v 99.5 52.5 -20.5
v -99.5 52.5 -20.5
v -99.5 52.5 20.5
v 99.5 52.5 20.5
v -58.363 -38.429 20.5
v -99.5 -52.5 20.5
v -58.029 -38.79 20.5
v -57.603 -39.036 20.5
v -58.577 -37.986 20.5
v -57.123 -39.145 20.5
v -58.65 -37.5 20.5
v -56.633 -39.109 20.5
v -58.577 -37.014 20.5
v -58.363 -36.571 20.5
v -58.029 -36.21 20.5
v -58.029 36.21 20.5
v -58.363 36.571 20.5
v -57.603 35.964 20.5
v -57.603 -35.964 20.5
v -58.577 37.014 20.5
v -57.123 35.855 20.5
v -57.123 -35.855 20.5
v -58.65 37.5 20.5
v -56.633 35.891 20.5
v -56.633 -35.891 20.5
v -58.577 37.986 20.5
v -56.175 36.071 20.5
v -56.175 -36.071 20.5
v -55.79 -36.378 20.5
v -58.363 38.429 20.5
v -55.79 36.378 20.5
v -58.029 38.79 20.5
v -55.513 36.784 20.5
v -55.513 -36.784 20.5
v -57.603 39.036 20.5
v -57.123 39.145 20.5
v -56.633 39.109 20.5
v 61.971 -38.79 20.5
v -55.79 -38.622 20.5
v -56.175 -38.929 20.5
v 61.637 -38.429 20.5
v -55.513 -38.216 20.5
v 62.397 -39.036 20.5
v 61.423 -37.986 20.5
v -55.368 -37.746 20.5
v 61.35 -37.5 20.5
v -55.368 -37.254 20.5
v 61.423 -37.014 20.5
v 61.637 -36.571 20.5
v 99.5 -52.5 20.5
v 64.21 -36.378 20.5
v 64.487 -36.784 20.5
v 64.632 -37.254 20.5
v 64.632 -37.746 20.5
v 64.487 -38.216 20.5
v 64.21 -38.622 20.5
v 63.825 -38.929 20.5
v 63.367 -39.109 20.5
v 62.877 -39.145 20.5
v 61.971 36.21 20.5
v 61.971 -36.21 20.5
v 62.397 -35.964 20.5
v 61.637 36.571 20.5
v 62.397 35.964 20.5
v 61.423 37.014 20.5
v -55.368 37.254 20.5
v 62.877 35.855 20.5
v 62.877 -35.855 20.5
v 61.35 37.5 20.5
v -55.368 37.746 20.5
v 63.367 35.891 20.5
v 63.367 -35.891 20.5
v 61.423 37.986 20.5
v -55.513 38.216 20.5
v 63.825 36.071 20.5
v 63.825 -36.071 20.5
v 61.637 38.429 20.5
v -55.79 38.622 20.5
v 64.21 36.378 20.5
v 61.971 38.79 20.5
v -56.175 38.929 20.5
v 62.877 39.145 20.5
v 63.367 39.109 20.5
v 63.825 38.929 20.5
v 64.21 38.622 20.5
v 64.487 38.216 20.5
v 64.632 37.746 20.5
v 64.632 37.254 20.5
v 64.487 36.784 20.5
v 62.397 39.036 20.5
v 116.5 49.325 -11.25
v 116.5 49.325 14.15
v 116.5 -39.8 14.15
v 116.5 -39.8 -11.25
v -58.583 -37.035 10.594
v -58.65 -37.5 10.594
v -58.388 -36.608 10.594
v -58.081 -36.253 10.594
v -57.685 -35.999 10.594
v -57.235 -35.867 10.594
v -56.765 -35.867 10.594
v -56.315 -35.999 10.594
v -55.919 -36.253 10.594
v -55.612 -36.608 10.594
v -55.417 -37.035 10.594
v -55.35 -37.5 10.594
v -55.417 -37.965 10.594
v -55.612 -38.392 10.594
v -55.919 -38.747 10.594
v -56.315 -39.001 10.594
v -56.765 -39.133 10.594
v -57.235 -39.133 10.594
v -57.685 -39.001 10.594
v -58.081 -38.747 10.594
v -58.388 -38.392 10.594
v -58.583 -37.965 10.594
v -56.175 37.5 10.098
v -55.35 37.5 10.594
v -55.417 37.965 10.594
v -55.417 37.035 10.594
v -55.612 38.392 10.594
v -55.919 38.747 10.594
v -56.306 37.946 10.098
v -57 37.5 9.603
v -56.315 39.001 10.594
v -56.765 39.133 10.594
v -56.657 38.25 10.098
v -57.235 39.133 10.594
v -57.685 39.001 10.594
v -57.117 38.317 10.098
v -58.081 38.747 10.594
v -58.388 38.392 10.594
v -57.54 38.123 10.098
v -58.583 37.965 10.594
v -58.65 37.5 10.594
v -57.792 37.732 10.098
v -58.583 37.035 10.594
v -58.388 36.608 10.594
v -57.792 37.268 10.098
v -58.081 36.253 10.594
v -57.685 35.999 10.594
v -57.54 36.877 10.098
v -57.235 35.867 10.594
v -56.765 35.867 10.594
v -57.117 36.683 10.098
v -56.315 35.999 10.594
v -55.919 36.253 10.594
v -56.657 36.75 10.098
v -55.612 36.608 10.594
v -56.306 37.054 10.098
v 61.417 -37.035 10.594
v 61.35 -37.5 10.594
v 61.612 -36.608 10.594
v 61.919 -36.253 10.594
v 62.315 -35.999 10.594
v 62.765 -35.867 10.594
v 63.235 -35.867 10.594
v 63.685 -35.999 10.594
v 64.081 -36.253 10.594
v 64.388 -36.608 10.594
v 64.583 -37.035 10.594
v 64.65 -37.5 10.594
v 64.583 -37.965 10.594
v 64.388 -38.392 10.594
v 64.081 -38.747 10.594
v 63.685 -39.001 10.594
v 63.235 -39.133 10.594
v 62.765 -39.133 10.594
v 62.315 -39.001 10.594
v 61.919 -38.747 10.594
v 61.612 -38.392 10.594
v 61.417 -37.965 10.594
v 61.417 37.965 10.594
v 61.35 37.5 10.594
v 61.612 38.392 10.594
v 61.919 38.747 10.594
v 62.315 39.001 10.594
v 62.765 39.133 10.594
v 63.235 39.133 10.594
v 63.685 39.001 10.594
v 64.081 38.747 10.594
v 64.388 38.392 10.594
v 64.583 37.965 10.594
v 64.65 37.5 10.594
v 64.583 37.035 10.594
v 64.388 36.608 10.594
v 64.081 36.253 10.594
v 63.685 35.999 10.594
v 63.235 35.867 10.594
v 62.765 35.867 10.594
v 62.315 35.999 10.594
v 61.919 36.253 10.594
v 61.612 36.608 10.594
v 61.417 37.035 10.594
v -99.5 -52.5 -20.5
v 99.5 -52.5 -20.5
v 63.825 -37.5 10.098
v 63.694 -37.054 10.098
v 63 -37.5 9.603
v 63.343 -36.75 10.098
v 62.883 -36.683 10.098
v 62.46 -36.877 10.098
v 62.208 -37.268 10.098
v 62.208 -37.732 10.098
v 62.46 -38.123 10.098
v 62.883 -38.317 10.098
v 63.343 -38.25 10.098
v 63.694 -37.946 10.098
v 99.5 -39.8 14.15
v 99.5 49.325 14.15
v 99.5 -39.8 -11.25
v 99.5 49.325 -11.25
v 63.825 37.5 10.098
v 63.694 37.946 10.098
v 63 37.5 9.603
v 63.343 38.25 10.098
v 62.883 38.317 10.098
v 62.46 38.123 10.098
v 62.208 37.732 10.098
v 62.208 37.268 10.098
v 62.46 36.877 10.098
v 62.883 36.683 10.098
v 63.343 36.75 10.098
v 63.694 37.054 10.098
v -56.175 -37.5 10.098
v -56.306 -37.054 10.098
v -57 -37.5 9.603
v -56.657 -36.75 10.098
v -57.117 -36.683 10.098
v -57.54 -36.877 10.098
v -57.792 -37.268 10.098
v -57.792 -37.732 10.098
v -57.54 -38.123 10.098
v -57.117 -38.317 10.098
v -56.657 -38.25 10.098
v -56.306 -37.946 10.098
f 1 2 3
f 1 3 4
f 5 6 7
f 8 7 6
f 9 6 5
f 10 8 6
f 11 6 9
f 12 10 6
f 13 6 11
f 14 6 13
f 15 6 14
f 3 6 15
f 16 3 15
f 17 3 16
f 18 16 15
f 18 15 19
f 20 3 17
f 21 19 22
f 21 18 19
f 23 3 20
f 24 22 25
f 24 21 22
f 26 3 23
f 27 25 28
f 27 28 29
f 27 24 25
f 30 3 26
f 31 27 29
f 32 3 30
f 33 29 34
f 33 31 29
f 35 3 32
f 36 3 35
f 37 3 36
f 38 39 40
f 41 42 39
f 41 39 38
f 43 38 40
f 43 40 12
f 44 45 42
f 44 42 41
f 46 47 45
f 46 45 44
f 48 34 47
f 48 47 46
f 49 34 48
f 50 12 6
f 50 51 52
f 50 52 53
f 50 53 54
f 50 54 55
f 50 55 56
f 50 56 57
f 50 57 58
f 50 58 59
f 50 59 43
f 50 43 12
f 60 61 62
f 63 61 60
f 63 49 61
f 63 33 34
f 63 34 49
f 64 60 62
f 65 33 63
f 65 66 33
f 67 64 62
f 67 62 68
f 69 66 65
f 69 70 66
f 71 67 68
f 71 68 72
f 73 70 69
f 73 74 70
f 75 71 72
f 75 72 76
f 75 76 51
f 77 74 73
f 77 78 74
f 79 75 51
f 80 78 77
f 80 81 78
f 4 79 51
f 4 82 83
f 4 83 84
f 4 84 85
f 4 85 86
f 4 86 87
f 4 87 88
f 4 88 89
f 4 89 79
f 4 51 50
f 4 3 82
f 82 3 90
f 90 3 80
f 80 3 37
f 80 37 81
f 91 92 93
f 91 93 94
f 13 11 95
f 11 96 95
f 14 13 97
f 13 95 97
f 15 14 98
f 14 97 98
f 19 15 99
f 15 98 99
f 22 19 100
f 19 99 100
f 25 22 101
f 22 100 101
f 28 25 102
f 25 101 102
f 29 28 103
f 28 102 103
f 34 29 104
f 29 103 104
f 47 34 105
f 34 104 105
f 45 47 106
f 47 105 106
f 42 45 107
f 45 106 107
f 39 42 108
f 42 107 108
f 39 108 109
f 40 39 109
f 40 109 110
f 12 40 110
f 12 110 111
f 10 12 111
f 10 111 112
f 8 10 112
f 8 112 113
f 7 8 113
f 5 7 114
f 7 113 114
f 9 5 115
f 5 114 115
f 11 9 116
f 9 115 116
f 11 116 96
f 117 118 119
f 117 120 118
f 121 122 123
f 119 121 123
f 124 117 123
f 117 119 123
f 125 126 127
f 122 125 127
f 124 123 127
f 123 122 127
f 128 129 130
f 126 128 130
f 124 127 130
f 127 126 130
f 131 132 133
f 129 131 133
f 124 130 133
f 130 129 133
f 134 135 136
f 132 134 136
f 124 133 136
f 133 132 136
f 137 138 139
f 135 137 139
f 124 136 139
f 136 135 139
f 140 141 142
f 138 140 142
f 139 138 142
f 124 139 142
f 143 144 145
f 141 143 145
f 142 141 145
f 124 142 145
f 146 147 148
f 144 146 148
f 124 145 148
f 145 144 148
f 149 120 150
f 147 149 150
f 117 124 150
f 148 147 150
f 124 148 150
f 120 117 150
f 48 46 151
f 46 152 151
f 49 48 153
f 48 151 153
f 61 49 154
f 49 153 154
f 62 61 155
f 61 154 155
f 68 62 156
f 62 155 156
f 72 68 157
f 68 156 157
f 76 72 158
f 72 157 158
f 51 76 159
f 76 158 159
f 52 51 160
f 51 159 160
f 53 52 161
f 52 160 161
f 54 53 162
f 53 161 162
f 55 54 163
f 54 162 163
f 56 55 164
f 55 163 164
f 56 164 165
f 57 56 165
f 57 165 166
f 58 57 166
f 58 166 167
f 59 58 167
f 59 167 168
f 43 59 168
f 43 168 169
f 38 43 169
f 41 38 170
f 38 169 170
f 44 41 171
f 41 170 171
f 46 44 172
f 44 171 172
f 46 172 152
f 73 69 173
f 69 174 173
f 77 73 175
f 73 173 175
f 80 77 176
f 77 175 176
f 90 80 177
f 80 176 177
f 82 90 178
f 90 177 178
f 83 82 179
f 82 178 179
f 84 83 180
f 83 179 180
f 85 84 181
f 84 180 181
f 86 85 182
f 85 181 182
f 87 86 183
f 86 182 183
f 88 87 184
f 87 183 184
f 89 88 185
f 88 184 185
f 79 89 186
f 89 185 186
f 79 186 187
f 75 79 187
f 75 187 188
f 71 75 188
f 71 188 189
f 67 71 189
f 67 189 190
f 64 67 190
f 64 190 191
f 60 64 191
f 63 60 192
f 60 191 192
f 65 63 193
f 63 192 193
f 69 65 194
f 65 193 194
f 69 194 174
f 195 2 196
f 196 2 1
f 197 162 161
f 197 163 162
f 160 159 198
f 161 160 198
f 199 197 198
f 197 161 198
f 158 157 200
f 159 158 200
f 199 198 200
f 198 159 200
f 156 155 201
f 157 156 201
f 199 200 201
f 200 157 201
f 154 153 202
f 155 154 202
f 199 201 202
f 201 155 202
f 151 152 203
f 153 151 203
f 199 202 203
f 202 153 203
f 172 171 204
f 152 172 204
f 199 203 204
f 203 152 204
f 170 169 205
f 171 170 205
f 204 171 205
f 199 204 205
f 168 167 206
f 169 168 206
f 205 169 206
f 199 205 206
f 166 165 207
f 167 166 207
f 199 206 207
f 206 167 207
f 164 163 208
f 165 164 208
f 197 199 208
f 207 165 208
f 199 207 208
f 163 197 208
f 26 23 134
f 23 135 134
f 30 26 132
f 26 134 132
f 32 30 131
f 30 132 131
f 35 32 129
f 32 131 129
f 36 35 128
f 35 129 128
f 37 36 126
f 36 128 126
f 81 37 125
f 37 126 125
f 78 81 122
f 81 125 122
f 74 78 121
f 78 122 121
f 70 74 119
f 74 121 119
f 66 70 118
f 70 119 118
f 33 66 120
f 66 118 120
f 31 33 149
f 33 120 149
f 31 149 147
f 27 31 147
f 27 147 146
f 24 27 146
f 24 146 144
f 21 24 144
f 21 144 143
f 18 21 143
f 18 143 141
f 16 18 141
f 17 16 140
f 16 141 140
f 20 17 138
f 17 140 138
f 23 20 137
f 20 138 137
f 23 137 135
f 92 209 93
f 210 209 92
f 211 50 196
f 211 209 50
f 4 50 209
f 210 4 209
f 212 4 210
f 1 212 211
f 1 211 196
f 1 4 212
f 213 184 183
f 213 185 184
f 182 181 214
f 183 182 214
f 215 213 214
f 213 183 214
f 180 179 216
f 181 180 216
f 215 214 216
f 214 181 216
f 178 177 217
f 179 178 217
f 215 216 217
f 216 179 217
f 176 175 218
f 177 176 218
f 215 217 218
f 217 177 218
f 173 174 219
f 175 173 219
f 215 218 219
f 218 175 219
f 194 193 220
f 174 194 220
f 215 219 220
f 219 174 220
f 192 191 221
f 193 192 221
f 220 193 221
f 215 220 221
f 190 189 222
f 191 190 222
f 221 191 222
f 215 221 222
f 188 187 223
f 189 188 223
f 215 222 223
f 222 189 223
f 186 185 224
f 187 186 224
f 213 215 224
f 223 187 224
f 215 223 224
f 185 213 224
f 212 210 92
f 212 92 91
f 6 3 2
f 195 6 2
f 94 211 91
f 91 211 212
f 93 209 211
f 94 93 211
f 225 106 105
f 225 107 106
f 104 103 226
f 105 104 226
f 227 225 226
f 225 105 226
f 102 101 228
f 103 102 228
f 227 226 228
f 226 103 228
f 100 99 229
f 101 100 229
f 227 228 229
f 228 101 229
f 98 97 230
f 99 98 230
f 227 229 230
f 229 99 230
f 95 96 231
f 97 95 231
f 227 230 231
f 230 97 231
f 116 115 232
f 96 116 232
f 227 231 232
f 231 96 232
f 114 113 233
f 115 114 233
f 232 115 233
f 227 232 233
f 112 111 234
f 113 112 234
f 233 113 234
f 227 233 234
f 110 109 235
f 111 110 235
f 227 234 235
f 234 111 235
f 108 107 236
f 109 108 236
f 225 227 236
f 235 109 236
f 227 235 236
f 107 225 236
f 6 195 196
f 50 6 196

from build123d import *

# Parameters (mm, degrees)
SKETCH1_W                 = 199
SKETCH1_H                 = 41
BOSS_EXTRUDE1_DEPTH       = 52.5
SKETCH10_W                = 25.4
SKETCH10_H                = 89.125
BOSS_EXTRUDE6_DEPTH       = 17
M4X0_7_TAPPED_HOLE1_D     = 3.3
M4X0_7_TAPPED_HOLE1_DEPTH = 9.906
M4X0_7_TAPPED_HOLE1_TIP   = 0.991420021


with BuildPart() as part:
    # Sketch1 → Boss-Extrude1 (new, symmetric)
    with BuildSketch(Plane(origin=(0, 0, 0), x_dir=(1, 0, 0), z_dir=(0, 1, 0))):
        Rectangle(SKETCH1_W, SKETCH1_H)
    extrude(amount=BOSS_EXTRUDE1_DEPTH, both=True)

    # Sketch10 → Boss-Extrude6 (add)
    with BuildSketch(Plane(origin=(99.5, 0, 0), x_dir=(0, 0, -1), z_dir=(1, 0, 0))):
        with Locations((-1.45, 4.7625)):
            Rectangle(SKETCH10_W, SKETCH10_H)
    extrude(amount=BOSS_EXTRUDE6_DEPTH)

    # M4x0.7 Tapped Hole1
    with Locations(Plane.XY.offset(20.5)):
        with Locations((-57, 37.5), (63, -37.5), (-57, -37.5), (63, 37.5)):
            Hole(M4X0_7_TAPPED_HOLE1_D / 2, depth=M4X0_7_TAPPED_HOLE1_DEPTH)
            with Locations((0, 0, -(M4X0_7_TAPPED_HOLE1_DEPTH + M4X0_7_TAPPED_HOLE1_TIP / 2))):  # 118° drill point
                Cone(0, M4X0_7_TAPPED_HOLE1_D / 2, M4X0_7_TAPPED_HOLE1_TIP, mode=Mode.SUBTRACT)


solid = part.part
